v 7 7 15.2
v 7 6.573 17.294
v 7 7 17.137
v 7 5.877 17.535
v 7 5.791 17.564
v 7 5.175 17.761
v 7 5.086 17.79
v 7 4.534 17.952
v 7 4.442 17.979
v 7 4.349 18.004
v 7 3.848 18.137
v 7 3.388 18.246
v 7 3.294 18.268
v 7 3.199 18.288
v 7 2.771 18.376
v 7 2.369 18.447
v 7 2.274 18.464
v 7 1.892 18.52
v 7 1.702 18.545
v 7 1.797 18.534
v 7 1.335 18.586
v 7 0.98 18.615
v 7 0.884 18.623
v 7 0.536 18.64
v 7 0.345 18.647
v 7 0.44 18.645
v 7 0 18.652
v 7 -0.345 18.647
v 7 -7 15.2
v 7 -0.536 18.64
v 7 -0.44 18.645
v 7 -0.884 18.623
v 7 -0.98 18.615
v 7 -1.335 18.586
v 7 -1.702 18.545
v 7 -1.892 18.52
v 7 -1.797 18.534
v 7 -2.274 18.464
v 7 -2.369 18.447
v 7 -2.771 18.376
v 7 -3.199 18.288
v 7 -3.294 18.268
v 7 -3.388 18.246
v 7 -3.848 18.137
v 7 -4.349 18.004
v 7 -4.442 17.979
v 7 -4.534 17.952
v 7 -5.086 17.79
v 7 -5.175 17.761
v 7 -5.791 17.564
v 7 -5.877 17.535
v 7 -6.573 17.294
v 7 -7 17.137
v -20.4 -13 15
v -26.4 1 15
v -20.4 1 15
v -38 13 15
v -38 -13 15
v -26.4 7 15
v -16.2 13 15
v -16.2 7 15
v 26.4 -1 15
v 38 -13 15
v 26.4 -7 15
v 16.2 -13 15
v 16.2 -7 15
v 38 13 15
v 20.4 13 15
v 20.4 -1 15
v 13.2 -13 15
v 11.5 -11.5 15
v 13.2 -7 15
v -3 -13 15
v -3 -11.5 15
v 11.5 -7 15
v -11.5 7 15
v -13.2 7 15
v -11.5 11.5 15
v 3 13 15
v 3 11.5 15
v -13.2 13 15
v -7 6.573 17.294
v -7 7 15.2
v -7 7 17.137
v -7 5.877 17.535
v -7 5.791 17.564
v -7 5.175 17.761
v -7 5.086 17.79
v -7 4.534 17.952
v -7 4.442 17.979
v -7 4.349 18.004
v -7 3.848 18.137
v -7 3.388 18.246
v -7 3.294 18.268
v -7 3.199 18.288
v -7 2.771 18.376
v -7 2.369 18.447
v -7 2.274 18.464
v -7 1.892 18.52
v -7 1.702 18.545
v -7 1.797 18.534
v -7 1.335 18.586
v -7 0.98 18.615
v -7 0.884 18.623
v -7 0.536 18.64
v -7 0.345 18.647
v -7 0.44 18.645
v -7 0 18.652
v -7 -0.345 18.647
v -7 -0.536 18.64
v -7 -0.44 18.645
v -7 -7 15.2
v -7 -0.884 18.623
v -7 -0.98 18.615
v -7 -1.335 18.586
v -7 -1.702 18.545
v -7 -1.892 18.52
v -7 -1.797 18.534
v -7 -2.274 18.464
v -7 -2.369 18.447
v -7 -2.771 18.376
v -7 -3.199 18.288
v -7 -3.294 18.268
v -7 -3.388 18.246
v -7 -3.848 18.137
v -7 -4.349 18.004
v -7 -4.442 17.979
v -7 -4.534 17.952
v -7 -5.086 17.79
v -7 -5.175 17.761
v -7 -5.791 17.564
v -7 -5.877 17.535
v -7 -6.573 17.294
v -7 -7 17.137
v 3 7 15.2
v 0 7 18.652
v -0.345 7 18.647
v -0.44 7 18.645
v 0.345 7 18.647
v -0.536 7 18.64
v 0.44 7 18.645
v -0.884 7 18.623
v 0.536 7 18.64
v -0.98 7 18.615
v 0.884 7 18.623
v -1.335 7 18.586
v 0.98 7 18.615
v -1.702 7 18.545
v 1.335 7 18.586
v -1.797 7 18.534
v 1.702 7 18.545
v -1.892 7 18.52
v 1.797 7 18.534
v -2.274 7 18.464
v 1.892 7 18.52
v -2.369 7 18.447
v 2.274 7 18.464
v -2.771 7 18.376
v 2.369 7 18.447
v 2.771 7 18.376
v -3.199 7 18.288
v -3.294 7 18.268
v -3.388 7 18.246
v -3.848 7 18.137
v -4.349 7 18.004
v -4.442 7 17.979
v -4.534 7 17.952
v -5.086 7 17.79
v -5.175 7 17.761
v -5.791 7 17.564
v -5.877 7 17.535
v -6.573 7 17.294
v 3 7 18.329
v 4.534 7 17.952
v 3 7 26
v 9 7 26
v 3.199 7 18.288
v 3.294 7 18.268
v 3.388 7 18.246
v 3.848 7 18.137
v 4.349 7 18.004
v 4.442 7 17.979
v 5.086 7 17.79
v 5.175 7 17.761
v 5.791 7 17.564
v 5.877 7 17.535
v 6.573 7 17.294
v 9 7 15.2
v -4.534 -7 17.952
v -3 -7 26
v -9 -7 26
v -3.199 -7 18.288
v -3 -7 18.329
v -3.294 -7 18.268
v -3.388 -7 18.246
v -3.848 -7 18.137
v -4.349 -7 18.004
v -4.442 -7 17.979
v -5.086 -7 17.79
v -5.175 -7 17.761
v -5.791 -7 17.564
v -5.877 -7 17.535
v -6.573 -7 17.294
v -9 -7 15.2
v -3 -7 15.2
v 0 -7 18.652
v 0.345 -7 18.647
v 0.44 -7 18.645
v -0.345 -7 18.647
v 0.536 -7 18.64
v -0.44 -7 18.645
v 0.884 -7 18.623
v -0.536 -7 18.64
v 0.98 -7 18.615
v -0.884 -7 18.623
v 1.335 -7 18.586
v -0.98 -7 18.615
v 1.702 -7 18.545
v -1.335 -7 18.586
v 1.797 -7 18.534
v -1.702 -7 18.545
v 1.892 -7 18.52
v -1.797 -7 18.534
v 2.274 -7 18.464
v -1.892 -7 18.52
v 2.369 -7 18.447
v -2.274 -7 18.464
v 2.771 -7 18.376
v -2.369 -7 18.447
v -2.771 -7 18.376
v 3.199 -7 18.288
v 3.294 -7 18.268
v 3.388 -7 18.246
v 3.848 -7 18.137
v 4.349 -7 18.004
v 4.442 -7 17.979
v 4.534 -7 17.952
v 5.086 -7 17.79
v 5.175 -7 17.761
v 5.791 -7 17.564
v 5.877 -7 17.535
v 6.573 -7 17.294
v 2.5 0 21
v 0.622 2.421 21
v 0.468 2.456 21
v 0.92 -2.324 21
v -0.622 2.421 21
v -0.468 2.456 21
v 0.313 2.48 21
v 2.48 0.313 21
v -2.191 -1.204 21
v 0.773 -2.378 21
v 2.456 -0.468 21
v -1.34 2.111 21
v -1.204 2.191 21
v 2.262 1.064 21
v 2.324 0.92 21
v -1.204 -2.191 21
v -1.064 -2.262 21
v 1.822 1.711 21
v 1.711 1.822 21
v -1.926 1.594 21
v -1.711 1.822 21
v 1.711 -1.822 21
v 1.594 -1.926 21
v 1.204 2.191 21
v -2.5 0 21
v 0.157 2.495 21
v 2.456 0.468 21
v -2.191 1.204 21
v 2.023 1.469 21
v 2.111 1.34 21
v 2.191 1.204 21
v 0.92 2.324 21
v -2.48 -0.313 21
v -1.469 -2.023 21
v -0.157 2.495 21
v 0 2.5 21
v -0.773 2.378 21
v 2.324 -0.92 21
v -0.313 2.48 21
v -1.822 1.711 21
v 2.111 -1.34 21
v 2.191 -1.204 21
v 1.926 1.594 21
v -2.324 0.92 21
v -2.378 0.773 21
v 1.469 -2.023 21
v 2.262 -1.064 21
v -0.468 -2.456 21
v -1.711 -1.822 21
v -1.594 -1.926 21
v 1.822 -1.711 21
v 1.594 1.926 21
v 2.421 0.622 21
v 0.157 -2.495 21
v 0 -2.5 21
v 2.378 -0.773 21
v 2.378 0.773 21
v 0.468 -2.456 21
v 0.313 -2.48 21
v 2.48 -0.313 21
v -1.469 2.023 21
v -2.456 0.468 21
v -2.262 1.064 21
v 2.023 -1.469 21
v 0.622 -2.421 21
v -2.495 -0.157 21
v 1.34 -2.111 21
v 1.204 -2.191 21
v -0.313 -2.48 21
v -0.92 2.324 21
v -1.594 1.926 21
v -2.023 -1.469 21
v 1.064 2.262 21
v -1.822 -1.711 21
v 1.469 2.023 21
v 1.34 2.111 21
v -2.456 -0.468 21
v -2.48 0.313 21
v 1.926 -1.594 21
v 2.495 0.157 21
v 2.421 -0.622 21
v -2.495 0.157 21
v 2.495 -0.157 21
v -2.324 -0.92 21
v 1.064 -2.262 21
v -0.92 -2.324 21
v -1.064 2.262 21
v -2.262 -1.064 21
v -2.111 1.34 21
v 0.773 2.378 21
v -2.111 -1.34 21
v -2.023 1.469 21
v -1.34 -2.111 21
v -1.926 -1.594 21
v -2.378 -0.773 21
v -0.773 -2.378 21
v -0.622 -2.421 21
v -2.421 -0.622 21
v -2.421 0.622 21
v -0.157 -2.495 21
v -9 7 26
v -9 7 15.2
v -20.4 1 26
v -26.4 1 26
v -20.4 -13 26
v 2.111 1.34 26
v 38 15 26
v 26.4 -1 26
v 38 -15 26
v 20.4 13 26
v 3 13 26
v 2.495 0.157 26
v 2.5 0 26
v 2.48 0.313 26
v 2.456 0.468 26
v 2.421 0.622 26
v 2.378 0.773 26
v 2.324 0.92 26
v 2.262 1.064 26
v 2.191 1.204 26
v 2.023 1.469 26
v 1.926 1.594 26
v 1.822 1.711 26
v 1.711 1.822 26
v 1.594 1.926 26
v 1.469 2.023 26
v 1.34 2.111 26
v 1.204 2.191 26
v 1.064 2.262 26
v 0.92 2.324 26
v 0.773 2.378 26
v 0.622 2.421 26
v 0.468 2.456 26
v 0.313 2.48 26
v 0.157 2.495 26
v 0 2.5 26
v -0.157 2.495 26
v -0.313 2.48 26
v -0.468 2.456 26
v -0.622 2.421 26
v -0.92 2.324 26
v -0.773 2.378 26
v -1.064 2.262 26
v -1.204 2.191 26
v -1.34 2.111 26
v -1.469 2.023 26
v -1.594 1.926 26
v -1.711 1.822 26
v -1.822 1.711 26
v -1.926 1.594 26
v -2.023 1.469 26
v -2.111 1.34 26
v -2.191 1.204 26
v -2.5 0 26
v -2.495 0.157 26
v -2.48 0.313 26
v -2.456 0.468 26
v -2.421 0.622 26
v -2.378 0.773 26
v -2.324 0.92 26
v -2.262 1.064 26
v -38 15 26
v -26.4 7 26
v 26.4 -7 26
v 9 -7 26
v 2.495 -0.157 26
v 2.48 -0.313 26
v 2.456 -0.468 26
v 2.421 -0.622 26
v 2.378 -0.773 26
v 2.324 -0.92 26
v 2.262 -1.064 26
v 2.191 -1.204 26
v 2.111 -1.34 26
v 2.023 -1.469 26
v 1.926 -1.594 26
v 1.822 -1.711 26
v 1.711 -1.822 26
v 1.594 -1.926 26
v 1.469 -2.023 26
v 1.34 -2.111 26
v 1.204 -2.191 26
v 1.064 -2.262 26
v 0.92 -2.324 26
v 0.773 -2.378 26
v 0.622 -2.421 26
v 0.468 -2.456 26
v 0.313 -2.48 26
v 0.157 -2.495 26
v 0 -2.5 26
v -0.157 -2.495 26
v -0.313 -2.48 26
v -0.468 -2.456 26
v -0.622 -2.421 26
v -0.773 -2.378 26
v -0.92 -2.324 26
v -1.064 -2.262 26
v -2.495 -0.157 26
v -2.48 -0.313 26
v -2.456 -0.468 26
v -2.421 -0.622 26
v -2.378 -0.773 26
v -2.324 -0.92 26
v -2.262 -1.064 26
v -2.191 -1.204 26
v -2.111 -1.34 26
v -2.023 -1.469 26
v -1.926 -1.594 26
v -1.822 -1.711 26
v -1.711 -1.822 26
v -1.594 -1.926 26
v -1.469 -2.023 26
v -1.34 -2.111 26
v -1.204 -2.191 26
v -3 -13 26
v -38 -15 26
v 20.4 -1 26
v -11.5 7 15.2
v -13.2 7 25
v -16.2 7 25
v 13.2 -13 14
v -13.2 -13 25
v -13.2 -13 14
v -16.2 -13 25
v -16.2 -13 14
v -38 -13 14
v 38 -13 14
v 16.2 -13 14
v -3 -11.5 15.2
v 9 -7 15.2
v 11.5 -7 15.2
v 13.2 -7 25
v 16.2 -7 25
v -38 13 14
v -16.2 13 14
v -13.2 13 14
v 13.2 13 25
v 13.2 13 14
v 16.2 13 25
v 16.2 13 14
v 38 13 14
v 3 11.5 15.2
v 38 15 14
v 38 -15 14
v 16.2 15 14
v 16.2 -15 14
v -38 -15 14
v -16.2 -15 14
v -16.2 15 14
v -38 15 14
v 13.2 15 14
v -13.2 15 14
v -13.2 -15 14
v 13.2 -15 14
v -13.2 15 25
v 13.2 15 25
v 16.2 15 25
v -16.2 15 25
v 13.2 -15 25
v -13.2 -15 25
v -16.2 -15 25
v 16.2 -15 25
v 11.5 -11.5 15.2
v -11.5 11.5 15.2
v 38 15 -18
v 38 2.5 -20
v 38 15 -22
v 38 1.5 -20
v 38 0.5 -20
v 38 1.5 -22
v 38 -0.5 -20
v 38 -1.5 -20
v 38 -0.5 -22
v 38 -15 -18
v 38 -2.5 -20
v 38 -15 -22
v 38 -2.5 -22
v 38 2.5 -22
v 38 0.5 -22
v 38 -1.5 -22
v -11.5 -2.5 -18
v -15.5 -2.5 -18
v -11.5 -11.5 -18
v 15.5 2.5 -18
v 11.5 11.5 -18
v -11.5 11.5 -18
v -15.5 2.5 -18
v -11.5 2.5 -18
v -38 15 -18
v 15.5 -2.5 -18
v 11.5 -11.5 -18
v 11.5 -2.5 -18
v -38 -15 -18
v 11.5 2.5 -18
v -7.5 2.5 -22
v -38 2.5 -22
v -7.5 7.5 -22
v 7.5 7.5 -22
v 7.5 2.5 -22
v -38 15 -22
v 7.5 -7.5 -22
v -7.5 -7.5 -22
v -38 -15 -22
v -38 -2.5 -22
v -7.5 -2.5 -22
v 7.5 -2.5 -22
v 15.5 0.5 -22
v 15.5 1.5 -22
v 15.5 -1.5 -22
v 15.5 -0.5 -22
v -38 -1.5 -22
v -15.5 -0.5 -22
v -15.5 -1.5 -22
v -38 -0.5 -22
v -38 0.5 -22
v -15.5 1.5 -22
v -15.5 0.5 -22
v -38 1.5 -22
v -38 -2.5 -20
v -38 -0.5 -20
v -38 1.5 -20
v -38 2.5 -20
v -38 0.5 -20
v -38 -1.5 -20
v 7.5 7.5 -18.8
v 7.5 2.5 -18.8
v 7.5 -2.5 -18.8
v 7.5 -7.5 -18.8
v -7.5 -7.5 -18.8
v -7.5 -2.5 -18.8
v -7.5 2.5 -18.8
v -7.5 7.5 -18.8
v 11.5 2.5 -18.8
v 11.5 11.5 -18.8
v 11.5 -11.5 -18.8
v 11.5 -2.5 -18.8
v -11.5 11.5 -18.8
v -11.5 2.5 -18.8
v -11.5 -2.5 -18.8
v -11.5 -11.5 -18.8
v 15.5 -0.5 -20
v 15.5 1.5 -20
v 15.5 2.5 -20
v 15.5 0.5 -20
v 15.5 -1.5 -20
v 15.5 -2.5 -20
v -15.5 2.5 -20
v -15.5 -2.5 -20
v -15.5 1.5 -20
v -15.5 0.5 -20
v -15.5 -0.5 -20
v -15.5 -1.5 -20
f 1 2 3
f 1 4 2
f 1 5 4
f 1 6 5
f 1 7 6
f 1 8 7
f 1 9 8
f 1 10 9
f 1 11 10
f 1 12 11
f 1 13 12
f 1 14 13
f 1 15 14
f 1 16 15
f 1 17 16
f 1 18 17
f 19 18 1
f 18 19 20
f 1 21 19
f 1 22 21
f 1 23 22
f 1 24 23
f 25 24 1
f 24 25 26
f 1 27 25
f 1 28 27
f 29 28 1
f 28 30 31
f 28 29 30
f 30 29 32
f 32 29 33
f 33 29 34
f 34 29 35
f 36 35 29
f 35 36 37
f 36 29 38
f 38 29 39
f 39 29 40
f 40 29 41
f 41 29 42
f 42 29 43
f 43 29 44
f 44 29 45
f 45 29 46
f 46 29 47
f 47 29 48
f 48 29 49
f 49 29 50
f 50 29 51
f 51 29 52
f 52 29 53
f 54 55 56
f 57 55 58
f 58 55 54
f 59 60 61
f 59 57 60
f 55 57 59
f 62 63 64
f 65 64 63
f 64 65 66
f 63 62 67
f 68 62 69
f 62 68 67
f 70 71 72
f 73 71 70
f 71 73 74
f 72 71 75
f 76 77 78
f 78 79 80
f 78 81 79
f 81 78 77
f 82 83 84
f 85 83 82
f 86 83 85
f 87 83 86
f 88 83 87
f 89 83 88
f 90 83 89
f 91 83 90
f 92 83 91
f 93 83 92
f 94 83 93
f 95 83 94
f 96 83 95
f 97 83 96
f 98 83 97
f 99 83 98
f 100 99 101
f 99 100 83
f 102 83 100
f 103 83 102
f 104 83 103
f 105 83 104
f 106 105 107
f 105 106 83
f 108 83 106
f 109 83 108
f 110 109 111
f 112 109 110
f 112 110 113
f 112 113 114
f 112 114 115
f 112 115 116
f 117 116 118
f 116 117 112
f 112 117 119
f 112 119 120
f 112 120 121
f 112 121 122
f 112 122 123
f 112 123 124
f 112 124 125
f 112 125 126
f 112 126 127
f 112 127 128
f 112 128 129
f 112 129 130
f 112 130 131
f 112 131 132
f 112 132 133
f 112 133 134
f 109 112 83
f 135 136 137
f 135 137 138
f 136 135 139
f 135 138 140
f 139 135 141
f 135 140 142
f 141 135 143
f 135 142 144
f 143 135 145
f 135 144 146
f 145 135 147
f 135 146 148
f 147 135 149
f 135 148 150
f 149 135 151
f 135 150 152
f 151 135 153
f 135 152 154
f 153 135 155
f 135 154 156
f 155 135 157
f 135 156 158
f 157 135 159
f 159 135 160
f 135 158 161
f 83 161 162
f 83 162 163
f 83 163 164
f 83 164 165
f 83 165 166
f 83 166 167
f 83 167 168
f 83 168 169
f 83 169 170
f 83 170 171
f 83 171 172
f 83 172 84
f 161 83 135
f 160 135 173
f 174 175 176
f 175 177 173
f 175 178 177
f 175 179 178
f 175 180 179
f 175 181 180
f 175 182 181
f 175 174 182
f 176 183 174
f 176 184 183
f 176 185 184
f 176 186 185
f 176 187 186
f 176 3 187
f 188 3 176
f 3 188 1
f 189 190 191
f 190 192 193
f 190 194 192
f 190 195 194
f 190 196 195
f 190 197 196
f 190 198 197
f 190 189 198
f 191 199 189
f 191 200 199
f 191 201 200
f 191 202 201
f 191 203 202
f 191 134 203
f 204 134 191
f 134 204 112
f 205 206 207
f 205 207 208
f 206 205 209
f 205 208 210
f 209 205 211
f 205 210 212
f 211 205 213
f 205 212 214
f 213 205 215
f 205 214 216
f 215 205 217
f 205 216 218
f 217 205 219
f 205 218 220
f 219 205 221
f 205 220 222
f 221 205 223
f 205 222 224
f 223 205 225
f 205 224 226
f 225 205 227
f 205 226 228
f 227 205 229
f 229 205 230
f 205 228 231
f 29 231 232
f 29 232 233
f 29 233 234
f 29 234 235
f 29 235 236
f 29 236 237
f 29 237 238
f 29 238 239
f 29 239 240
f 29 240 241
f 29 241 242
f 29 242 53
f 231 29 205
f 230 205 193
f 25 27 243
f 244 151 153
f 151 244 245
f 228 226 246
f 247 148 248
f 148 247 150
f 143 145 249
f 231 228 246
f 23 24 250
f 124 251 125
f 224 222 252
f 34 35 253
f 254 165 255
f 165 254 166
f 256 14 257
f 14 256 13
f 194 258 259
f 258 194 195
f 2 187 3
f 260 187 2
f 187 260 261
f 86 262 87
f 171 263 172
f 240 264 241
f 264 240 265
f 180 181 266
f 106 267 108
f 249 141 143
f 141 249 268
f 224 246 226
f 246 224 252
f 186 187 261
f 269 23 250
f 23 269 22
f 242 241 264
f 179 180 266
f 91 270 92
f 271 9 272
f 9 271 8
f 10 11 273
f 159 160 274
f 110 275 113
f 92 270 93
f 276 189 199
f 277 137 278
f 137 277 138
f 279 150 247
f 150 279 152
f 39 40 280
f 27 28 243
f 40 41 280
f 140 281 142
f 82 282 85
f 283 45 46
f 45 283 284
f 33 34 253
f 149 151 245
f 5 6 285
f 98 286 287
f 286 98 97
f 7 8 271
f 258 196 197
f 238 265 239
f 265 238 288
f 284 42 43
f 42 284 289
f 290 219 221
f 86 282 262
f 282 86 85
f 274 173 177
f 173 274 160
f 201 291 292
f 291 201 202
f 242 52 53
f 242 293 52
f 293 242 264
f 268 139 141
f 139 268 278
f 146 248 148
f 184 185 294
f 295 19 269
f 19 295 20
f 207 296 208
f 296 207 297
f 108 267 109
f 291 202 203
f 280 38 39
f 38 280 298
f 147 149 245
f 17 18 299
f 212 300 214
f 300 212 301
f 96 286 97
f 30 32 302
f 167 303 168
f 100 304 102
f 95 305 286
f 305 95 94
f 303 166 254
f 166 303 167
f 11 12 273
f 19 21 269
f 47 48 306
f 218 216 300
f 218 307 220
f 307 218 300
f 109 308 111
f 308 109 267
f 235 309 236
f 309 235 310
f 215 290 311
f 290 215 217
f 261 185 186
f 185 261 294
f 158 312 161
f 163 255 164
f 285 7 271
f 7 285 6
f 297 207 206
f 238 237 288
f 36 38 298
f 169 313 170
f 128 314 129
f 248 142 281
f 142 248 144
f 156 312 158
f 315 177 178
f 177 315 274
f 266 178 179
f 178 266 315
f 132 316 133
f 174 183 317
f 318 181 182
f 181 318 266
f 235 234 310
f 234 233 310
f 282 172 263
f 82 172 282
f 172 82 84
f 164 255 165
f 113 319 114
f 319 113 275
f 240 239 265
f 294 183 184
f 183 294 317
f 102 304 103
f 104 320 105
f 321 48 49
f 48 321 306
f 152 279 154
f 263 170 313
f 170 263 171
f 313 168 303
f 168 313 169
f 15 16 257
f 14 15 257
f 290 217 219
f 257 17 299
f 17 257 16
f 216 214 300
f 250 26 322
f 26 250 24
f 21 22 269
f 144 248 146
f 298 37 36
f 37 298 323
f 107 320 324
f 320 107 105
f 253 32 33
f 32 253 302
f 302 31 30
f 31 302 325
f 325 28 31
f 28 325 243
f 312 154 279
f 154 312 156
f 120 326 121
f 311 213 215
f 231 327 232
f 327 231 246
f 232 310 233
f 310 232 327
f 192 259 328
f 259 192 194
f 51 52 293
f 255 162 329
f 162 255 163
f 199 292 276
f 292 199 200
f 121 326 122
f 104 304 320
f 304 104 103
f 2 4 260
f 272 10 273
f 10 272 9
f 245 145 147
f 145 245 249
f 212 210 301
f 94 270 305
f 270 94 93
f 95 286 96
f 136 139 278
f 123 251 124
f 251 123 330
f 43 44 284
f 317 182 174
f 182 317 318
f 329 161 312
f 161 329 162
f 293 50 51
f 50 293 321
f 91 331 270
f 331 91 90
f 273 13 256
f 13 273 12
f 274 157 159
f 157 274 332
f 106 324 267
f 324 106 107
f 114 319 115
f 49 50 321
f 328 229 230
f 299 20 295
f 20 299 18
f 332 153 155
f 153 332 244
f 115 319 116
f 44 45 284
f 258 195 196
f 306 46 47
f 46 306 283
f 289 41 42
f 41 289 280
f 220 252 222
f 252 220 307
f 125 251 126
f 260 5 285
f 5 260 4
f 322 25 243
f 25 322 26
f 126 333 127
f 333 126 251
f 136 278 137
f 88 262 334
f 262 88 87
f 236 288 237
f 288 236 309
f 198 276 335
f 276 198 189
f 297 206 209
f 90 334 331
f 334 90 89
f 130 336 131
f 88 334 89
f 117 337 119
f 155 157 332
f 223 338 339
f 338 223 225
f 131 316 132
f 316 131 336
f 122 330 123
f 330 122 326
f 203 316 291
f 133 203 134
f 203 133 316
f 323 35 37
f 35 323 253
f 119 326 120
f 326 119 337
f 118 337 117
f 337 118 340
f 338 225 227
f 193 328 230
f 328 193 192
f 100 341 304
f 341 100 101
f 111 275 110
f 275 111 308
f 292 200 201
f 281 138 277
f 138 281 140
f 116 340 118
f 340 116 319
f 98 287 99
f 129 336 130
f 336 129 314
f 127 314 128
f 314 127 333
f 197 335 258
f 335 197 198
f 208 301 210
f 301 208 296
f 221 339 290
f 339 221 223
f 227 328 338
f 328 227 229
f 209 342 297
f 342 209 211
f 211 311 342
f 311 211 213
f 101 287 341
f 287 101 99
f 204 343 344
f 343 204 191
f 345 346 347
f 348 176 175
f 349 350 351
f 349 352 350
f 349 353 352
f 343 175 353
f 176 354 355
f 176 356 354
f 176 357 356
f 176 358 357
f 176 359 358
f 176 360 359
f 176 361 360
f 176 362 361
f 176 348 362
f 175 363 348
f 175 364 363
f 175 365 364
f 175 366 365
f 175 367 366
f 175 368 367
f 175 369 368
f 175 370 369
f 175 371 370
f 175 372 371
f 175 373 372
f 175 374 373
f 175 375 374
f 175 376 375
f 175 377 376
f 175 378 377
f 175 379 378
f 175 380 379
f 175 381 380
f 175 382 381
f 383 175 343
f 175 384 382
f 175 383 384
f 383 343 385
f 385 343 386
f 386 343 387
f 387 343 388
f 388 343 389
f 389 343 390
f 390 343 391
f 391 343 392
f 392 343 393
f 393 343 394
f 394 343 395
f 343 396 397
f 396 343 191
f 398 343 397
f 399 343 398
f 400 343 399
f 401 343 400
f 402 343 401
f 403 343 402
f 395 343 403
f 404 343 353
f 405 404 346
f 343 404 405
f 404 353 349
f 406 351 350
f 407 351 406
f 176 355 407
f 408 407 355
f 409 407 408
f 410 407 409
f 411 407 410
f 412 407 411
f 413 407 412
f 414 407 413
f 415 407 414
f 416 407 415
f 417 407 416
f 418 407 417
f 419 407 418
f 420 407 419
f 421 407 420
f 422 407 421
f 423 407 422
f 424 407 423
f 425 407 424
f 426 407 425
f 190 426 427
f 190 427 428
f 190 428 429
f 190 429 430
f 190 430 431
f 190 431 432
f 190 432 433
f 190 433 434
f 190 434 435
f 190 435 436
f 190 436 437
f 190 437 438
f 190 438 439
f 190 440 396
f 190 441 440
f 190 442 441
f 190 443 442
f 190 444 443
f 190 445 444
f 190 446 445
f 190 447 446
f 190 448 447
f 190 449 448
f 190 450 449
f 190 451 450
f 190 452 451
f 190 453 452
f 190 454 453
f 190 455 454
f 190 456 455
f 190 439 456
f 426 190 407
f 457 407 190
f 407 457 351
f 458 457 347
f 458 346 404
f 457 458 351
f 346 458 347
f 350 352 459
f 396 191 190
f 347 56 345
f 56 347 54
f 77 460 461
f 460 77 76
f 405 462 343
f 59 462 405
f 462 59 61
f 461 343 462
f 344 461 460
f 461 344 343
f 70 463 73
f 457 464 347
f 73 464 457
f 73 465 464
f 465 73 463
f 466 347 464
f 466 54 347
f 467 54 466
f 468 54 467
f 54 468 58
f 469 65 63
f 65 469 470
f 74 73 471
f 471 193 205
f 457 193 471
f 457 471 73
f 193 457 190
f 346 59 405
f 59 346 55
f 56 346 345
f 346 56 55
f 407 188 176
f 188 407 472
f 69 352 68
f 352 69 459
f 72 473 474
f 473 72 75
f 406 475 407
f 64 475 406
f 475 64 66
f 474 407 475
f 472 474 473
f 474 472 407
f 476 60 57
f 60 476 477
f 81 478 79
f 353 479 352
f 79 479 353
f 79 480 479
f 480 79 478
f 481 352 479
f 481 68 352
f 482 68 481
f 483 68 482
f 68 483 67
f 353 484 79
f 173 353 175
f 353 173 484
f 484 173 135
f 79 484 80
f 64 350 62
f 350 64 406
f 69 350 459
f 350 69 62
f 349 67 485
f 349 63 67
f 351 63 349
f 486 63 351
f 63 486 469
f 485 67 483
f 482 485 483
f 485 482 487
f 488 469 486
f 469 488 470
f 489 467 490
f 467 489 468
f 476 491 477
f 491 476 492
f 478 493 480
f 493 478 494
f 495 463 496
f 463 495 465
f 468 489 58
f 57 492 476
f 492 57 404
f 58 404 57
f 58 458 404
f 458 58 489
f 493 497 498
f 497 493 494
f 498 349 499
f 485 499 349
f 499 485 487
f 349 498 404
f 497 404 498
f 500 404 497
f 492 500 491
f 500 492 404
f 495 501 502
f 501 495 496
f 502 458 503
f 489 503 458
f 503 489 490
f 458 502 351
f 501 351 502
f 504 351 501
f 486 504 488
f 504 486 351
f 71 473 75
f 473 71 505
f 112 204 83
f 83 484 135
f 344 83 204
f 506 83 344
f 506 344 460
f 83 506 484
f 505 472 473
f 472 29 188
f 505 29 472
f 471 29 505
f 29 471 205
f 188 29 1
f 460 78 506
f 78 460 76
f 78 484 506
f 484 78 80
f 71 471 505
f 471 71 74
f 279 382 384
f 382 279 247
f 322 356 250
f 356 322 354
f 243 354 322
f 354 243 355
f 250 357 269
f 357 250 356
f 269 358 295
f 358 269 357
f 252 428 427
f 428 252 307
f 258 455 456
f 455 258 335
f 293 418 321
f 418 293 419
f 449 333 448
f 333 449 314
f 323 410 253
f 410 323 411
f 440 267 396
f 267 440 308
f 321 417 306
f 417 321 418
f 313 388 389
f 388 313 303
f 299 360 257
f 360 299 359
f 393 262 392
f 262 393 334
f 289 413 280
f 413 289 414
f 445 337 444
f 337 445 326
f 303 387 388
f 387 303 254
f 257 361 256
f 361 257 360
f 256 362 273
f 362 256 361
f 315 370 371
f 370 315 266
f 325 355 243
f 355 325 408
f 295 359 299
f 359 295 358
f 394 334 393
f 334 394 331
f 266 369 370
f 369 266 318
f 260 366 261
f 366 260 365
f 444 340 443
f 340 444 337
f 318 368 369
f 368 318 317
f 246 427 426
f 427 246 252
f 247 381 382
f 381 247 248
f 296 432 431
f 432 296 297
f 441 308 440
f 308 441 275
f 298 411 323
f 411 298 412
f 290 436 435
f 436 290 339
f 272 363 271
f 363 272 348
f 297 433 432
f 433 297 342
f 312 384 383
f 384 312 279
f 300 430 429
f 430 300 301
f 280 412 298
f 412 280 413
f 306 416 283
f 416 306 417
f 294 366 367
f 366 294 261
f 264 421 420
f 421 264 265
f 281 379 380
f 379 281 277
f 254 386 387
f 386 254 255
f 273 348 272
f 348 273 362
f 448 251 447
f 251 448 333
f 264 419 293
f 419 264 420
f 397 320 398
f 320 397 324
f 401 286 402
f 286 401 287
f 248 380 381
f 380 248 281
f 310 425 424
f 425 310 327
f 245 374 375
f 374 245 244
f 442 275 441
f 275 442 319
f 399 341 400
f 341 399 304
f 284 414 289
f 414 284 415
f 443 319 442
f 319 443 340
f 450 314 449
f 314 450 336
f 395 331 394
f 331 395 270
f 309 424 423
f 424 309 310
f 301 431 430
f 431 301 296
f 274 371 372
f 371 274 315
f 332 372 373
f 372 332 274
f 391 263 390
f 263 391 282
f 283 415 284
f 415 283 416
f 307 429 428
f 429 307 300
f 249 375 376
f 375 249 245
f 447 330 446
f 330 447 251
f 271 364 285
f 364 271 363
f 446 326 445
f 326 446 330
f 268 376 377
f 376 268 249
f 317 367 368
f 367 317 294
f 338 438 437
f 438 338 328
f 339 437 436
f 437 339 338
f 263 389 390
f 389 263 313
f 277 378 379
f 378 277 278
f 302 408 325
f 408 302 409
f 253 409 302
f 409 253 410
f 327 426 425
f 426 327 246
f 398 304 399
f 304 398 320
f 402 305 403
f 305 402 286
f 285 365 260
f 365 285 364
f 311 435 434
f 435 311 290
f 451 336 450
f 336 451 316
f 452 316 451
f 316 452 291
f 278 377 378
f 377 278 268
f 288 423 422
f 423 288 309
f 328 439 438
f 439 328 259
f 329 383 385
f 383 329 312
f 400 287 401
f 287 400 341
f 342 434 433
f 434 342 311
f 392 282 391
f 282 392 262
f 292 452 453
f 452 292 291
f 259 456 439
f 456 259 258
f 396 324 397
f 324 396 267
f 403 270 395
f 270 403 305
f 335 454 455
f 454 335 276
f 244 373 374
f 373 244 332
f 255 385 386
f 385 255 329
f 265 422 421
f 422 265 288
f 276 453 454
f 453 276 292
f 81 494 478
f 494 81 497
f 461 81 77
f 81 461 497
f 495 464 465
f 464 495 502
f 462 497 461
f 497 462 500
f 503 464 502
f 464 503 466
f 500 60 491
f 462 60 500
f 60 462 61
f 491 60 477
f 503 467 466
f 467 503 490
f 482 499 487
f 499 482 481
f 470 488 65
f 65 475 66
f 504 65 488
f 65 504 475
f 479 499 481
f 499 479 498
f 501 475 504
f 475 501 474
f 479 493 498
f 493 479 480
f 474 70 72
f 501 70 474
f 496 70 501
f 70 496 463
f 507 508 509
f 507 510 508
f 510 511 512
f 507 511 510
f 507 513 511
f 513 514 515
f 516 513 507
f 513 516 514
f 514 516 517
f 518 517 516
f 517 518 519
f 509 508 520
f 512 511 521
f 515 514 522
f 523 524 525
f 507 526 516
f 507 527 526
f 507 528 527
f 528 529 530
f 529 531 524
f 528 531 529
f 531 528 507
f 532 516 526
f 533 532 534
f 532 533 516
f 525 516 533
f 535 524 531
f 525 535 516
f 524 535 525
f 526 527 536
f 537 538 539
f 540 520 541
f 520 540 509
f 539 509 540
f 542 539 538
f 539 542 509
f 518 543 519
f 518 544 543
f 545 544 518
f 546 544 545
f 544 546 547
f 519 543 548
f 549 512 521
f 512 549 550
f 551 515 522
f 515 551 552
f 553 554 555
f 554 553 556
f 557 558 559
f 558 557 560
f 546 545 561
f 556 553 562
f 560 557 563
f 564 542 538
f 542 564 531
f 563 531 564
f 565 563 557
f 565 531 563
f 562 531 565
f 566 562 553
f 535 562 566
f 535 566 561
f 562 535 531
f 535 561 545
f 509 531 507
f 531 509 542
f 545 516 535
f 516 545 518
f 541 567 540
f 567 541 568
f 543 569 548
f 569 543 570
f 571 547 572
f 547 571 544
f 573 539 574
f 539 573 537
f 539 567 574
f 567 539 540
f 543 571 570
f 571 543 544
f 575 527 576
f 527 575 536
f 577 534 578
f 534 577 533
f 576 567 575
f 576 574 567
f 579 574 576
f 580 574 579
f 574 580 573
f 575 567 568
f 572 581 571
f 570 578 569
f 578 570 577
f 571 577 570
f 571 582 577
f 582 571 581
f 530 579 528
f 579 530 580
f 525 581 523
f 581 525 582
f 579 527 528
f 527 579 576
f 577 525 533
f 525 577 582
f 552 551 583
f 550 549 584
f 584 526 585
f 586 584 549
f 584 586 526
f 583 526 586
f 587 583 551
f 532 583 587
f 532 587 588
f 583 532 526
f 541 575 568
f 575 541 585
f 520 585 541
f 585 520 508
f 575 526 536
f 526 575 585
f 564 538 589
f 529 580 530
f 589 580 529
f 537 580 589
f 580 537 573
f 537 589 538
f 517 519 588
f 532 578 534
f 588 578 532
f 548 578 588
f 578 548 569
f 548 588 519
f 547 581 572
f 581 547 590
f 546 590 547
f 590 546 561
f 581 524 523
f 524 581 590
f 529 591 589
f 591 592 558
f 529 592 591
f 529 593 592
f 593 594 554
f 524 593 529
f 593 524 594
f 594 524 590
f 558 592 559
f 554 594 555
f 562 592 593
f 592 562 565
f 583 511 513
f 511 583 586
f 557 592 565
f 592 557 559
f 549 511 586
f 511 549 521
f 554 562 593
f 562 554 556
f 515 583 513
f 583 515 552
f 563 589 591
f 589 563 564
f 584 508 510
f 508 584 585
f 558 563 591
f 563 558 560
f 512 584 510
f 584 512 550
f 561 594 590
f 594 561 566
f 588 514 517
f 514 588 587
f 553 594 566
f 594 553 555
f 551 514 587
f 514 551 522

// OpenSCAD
//* Incubator module for Waterscope *//
//* M. Delmans *//


//* Size of a glass slide *//
slideW = 26;
slideL = 76;
slideH = 1;

//* Size of a cover glass *//
coverW = 23;
coverH = 0.8;
paperH = 0.2;
frameW = 4; // Gene frame width

//* Size of a temperature sensor Dallas 18B20 *//
sensorL = 8;
sensorW = 5;
sensorH = 4;

//* Size of an LED *//
ledH = 5;
ledR = 2.5;

//* Size of a resistor heater RS 159-758 *//
heaterW=20;
heaterL = 11.4;
heaterWW = 6; // Size of an overhang
heaterH = 11;

holderFlankW = 2;

$fn = 100;


//* Stage module (bottom part) *//
module Stage(){
    difference(){
        cube([slideL, slideW + 2*holderFlankW, sensorH], center = true);
        
        cube([coverW - 2*frameW, coverW - 2*frameW, sensorH], center = true);
        translate([ 0, 0, 0.5*(sensorH - coverH) ]) cube([coverW, coverW, coverH], center = true);
        
        translate([0.5*( coverW - 2*frameW + sensorL ), 0, 0]) cube([sensorL, sensorW, sensorH], center = true);
        translate([-0.5*( coverW - 2*frameW + sensorL ), 0, 0]) cube([sensorL, sensorW, sensorH], center = true);
        
        translate([0, 0, -0.25*sensorH]) cube([slideL, 0.2*sensorW, 0.5*sensorH], center = true);
        translate([0, 0.4*sensorW, -0.25*sensorH]) cube([slideL, 0.2*sensorW, 0.5*sensorH], center = true);
        translate([0, -0.4*sensorW, -0.25*sensorH]) cube([slideL, 0.2*sensorW, 0.5*sensorH], center = true);
    }
}

//* Holder Module (top part) *//
module Holder(){
        
    //* LED reflector shape *//
    module pyramid(h, baseW, r){
        intersection(){
            translate([0, 0, 0.5*h]) cube([baseW, baseW, h], center = true);
            cylinder(h, baseW, r);
        }
    }
    
    //* Cutout for resistor heater RS 159-758 *//
    module heater(){
        translate([-0.5*heaterL, 0.5*heaterW - heaterWW, 0])union(){
            cube([heaterL, heaterW, heaterH], center = true);
            translate([0.5*(heaterWW + heaterL), 0.5*(heaterWW - heaterW), 0])cube([heaterWW, heaterWW, heaterH], center = true);
            translate([-0.5*(heaterWW + heaterL), -0.5*(heaterWW - heaterW), 0])cube([heaterWW, heaterWW, heaterH], center = true);
        }
    }
    
    difference(){
        cube([slideL, slideW+2*holderFlankW, slideH + heaterH], center = true);
        translate([0, 0, -0.5*heaterH]) cube([slideL, slideW, slideH ], center = true);
        translate([0, 0, 0.5*(slideH - heaterH) ]) pyramid(h = heaterH - ledH, baseW = slideW - 2*heaterWW, r = ledR);
        translate([0, 0, -0.5*(heaterH+slideH - paperH) + slideH])cube([coverW, coverW, paperH], center = true);
        translate([0, 0, 0.5*(heaterH + slideH) - ledH]) cylinder(ledH, ledR, ledR);
        translate([-0.5*slideW + frameW, -0.5*slideW + heaterWW, 0.5*slideH]) heater();
        rotate([0, 0, 180])translate([-0.5*slideW + frameW, -0.5*slideW + heaterWW, 0.5*slideH]) heater();
        translate([-0.5*slideW + frameW - 0.5*heaterL, 0, -0.5*slideH])cube([3, slideW + 2*holderFlankW, heaterH], center = true);
        translate([0.5*slideW - frameW + 0.5*heaterL, 0, -0.5*slideH])cube([3, slideW + 2*holderFlankW, heaterH], center = true);
    }
}

translate([0, 0, 20]) Holder();
translate([0, 0, -20]) Stage();
